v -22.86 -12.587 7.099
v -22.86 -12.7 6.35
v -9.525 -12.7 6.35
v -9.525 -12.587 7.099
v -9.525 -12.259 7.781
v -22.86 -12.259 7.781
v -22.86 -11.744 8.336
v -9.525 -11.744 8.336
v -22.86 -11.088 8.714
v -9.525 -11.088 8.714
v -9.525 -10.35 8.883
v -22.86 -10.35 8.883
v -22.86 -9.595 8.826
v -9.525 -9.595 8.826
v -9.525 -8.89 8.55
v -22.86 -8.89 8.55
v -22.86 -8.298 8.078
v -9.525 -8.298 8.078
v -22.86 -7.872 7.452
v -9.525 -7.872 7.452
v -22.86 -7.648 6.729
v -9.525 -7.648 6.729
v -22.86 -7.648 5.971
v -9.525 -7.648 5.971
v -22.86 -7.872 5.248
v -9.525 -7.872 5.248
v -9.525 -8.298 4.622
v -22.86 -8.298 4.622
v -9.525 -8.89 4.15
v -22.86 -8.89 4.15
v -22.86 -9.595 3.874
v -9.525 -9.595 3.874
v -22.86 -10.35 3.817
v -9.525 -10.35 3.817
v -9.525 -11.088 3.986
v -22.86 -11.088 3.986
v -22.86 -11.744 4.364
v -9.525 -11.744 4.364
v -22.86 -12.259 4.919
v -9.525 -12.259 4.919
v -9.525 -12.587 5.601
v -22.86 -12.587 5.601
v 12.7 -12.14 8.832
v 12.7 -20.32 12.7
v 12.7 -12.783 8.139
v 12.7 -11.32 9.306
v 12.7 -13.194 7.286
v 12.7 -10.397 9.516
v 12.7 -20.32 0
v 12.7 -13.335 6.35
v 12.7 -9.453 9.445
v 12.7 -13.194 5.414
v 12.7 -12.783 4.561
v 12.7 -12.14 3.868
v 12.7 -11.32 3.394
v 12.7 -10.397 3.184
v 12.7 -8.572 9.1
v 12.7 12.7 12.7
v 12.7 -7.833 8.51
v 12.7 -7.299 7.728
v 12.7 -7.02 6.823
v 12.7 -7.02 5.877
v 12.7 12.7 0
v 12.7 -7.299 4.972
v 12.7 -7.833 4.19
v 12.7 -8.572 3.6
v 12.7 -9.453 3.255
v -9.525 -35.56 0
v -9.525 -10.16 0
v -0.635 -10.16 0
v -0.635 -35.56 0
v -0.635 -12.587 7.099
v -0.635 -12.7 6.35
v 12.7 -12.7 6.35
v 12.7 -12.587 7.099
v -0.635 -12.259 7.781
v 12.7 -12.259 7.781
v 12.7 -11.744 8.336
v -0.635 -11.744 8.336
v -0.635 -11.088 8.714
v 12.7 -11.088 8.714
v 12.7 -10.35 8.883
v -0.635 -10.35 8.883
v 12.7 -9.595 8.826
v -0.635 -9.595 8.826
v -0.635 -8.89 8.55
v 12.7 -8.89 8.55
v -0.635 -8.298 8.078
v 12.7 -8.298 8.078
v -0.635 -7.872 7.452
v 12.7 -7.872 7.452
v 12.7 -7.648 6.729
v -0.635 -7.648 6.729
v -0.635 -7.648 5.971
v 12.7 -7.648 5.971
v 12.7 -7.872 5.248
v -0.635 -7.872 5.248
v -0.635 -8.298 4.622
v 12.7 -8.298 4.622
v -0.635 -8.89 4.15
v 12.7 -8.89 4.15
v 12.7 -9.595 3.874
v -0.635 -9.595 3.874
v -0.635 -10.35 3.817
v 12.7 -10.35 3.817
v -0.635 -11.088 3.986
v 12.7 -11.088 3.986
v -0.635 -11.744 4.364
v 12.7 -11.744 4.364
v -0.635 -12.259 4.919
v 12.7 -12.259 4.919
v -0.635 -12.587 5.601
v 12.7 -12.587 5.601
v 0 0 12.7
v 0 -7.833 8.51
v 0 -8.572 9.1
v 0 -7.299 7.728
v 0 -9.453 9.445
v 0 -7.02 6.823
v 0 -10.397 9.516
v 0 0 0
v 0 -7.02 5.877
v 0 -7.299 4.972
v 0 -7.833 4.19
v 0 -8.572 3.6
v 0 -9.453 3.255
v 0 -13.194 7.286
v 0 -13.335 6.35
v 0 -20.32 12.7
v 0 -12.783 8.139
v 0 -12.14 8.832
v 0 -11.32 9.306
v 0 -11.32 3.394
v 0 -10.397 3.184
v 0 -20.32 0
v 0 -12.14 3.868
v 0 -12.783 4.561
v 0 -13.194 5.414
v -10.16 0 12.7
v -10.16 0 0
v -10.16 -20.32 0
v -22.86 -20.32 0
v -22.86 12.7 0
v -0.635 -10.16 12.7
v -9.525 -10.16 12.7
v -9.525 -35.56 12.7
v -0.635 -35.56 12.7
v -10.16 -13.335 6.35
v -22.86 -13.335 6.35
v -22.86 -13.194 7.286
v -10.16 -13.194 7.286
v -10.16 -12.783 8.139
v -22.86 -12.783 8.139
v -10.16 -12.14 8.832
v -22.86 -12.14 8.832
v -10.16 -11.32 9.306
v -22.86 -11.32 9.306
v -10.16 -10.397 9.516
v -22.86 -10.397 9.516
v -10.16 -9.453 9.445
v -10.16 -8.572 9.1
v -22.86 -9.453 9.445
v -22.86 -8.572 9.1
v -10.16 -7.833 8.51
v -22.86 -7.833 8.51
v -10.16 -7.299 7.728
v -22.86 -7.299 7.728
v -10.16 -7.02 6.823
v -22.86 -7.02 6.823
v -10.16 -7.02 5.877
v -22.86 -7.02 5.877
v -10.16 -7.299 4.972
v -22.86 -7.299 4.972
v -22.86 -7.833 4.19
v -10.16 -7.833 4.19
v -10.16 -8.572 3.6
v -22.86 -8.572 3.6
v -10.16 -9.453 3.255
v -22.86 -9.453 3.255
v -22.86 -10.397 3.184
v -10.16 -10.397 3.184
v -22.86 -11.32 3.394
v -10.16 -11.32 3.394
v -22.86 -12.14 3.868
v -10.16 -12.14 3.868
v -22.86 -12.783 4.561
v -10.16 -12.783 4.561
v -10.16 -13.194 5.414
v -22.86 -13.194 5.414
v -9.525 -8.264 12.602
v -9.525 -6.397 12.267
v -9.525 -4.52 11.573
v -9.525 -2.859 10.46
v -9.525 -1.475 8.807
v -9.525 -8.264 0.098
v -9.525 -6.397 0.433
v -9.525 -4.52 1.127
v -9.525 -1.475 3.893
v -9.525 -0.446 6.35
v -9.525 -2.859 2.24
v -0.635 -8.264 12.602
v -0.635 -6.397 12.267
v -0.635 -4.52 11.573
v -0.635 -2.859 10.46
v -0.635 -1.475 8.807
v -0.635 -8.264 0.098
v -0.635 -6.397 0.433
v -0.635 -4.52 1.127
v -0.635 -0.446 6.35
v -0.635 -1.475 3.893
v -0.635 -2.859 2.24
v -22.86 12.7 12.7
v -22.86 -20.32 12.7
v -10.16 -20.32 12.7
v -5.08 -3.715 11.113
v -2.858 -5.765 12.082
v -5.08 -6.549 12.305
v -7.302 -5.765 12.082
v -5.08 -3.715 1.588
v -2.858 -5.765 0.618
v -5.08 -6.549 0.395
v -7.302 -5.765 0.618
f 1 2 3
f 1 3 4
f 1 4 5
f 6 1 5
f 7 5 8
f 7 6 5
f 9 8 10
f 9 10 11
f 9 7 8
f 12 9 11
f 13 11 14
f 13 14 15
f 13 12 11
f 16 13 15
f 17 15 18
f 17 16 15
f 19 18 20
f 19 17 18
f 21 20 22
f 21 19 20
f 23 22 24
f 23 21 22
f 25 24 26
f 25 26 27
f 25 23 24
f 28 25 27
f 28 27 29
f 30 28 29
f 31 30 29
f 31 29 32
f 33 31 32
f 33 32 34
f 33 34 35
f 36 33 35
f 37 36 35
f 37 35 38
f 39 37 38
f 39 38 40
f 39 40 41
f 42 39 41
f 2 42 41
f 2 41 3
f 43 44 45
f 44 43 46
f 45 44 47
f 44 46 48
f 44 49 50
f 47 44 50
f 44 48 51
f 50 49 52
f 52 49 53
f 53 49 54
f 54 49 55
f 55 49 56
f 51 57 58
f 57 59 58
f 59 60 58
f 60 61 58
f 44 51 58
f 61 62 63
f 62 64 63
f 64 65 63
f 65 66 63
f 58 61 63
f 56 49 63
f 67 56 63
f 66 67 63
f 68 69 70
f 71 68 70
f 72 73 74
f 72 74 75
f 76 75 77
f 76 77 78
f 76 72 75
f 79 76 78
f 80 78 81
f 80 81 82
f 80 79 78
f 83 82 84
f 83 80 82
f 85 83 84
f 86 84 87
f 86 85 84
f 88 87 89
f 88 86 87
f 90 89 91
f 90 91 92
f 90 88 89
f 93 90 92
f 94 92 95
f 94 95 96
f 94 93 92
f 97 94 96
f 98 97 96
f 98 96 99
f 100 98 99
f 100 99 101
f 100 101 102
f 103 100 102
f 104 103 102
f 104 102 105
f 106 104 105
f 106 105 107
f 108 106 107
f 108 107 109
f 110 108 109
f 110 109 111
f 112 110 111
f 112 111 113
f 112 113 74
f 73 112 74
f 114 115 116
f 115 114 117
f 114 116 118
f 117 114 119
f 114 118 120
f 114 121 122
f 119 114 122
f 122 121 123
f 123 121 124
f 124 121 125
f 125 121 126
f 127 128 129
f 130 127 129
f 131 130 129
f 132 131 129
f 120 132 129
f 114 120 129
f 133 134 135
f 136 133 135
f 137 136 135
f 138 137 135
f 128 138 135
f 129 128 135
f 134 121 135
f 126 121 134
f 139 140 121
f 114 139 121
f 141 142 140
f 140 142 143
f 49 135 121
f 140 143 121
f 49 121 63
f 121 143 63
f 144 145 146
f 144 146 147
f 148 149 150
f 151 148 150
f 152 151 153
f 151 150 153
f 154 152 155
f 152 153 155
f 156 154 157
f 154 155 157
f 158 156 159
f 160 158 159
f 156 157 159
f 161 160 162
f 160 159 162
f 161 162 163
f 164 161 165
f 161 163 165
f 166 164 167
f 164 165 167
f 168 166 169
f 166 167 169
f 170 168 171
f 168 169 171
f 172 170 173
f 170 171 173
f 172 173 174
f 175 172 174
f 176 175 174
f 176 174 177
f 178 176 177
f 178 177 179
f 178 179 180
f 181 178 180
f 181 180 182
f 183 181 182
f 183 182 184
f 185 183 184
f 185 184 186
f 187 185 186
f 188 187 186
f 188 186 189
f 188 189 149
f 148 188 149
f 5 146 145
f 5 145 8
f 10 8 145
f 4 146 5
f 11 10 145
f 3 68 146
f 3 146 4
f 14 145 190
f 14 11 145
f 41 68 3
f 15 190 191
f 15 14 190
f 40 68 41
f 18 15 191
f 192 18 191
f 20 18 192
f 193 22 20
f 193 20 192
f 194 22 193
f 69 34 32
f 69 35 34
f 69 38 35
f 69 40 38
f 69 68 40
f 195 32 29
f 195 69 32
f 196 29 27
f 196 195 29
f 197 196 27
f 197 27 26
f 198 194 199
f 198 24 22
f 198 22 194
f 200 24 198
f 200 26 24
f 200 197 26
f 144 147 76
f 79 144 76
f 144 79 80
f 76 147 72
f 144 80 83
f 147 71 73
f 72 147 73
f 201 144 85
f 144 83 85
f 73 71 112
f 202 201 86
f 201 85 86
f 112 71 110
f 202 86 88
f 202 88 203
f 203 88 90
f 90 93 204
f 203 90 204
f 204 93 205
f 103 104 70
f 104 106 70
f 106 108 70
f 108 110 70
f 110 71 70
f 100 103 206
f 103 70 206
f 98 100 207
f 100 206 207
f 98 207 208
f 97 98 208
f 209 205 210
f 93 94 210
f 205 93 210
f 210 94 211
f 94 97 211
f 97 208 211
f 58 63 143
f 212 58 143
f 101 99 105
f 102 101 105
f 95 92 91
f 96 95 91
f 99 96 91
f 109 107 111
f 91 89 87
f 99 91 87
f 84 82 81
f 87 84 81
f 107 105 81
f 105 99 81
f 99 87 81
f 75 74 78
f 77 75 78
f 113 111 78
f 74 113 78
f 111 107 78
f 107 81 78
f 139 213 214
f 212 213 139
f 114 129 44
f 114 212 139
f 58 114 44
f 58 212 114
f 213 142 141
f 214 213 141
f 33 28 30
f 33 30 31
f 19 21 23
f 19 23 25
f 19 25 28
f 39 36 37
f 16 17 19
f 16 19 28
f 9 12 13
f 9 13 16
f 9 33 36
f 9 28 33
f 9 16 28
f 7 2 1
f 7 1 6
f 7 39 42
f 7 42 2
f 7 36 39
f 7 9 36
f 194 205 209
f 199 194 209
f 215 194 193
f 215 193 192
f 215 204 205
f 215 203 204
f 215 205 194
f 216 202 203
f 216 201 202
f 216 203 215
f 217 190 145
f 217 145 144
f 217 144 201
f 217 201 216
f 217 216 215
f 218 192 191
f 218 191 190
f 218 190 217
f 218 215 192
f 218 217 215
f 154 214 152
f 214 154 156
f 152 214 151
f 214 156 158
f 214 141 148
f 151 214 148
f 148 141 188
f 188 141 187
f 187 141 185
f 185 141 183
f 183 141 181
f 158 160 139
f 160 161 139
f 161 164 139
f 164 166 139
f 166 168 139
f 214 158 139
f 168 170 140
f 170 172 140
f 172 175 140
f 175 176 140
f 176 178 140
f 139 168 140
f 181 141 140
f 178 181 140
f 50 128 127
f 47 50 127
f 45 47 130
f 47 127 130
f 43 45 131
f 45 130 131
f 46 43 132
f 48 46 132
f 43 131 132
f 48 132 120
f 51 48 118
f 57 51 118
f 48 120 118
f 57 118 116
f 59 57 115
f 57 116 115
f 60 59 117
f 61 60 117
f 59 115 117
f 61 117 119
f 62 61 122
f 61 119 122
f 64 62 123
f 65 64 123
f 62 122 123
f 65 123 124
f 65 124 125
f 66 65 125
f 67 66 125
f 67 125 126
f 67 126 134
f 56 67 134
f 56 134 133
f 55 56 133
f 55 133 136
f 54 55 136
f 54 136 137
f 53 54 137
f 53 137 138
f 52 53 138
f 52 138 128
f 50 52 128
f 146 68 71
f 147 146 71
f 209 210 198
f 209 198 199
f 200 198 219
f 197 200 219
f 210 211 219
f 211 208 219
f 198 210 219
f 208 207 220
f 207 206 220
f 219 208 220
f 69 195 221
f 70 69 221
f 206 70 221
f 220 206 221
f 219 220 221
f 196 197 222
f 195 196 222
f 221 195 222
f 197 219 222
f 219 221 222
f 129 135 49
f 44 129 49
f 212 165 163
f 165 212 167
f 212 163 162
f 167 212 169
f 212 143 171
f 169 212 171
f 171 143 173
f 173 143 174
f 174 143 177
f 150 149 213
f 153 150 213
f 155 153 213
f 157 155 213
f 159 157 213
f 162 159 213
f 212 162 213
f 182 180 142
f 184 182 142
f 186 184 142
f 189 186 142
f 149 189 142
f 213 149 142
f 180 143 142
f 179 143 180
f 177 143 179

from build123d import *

# Parameters (mm, degrees)
F1_DEPTH    = 12.7
F2_R        = 3.175
F3_DEPTH    = 50.8
F4_W        = 8.89
F4_H        = 35.56
F5_DEPTH    = 12.7
F6_R        = 2.54
F7_DEPTH    = 35.56
F8_T1_DEPTH = 59.69


# Not quite as in the source:
# - a fillet or chamfer that OpenCascade refuses, or shapes differently, is made with other operations: its cross-section is extruded or revolved along the edge and cut away or added


with BuildPart() as f1:
    # F0 (on Top) → F1 (new body)
    with BuildSketch(Plane.XY):
        Polygon((-10.16, 0), (0, 0), (0, -20.32), (12.7, -20.32), (12.7, 12.7), (-22.86, 12.7), (-22.86, -20.32), (-10.16, -20.32), align=None)
    extrude(amount=F1_DEPTH)

    # F2 (on face) → F3 (cut)
    with BuildSketch(Plane(origin=(-22.86, 0, 0), x_dir=(0, -1, 0), z_dir=(-1, 0, 0))):
        with Locations((10.16, 6.35)):
            Circle(F2_R)
    extrude(amount=-F3_DEPTH, mode=Mode.SUBTRACT)


with BuildPart() as f5:
    # F4 (on Top) → F5 (new body)
    with BuildSketch(Plane.XY):
        with Locations((-5.08, -17.78)):
            Rectangle(F4_W, F4_H)
    extrude(amount=F5_DEPTH)

    # F6 (on face) → F7 (join)
    with BuildSketch(Plane(origin=(-22.86, 0, 0), x_dir=(0, -1, 0), z_dir=(-1, 0, 0))):
        with Locations((10.16, 6.35)):
            Circle(F6_R)
    extrude(amount=-F7_DEPTH)

    # F8: fillet of radius 10.16 on 2 edges, made by hand

    # F8_s2 → F8_t1 (cut)
    with BuildSketch(Plane.YZ.offset(-34.925)):
        with BuildLine():
            add(Edge.make_bspline(
                [(-10.16, 12.7), (0, 12.7), (0, 2.54)],
                knots=[0, 0, 0, 1, 1, 1], degree=2, weights=[1, 1, 1]))
            Line((0, 2.54), (0, 12.7))
            Line((0, 12.7), (-10.16, 12.7))
        make_face()
        with BuildLine():
            add(Edge.make_bspline(
                [(-10.16, 0), (0, 0), (0, 10.16)],
                knots=[0, 0, 0, 1, 1, 1], degree=2, weights=[1, 1, 1]))
            Line((0, 10.16), (0, 0))
            Line((0, 0), (-10.16, 0))
        make_face()
    extrude(amount=F8_T1_DEPTH, mode=Mode.SUBTRACT)


solid = Compound([f1.part, f5.part])
